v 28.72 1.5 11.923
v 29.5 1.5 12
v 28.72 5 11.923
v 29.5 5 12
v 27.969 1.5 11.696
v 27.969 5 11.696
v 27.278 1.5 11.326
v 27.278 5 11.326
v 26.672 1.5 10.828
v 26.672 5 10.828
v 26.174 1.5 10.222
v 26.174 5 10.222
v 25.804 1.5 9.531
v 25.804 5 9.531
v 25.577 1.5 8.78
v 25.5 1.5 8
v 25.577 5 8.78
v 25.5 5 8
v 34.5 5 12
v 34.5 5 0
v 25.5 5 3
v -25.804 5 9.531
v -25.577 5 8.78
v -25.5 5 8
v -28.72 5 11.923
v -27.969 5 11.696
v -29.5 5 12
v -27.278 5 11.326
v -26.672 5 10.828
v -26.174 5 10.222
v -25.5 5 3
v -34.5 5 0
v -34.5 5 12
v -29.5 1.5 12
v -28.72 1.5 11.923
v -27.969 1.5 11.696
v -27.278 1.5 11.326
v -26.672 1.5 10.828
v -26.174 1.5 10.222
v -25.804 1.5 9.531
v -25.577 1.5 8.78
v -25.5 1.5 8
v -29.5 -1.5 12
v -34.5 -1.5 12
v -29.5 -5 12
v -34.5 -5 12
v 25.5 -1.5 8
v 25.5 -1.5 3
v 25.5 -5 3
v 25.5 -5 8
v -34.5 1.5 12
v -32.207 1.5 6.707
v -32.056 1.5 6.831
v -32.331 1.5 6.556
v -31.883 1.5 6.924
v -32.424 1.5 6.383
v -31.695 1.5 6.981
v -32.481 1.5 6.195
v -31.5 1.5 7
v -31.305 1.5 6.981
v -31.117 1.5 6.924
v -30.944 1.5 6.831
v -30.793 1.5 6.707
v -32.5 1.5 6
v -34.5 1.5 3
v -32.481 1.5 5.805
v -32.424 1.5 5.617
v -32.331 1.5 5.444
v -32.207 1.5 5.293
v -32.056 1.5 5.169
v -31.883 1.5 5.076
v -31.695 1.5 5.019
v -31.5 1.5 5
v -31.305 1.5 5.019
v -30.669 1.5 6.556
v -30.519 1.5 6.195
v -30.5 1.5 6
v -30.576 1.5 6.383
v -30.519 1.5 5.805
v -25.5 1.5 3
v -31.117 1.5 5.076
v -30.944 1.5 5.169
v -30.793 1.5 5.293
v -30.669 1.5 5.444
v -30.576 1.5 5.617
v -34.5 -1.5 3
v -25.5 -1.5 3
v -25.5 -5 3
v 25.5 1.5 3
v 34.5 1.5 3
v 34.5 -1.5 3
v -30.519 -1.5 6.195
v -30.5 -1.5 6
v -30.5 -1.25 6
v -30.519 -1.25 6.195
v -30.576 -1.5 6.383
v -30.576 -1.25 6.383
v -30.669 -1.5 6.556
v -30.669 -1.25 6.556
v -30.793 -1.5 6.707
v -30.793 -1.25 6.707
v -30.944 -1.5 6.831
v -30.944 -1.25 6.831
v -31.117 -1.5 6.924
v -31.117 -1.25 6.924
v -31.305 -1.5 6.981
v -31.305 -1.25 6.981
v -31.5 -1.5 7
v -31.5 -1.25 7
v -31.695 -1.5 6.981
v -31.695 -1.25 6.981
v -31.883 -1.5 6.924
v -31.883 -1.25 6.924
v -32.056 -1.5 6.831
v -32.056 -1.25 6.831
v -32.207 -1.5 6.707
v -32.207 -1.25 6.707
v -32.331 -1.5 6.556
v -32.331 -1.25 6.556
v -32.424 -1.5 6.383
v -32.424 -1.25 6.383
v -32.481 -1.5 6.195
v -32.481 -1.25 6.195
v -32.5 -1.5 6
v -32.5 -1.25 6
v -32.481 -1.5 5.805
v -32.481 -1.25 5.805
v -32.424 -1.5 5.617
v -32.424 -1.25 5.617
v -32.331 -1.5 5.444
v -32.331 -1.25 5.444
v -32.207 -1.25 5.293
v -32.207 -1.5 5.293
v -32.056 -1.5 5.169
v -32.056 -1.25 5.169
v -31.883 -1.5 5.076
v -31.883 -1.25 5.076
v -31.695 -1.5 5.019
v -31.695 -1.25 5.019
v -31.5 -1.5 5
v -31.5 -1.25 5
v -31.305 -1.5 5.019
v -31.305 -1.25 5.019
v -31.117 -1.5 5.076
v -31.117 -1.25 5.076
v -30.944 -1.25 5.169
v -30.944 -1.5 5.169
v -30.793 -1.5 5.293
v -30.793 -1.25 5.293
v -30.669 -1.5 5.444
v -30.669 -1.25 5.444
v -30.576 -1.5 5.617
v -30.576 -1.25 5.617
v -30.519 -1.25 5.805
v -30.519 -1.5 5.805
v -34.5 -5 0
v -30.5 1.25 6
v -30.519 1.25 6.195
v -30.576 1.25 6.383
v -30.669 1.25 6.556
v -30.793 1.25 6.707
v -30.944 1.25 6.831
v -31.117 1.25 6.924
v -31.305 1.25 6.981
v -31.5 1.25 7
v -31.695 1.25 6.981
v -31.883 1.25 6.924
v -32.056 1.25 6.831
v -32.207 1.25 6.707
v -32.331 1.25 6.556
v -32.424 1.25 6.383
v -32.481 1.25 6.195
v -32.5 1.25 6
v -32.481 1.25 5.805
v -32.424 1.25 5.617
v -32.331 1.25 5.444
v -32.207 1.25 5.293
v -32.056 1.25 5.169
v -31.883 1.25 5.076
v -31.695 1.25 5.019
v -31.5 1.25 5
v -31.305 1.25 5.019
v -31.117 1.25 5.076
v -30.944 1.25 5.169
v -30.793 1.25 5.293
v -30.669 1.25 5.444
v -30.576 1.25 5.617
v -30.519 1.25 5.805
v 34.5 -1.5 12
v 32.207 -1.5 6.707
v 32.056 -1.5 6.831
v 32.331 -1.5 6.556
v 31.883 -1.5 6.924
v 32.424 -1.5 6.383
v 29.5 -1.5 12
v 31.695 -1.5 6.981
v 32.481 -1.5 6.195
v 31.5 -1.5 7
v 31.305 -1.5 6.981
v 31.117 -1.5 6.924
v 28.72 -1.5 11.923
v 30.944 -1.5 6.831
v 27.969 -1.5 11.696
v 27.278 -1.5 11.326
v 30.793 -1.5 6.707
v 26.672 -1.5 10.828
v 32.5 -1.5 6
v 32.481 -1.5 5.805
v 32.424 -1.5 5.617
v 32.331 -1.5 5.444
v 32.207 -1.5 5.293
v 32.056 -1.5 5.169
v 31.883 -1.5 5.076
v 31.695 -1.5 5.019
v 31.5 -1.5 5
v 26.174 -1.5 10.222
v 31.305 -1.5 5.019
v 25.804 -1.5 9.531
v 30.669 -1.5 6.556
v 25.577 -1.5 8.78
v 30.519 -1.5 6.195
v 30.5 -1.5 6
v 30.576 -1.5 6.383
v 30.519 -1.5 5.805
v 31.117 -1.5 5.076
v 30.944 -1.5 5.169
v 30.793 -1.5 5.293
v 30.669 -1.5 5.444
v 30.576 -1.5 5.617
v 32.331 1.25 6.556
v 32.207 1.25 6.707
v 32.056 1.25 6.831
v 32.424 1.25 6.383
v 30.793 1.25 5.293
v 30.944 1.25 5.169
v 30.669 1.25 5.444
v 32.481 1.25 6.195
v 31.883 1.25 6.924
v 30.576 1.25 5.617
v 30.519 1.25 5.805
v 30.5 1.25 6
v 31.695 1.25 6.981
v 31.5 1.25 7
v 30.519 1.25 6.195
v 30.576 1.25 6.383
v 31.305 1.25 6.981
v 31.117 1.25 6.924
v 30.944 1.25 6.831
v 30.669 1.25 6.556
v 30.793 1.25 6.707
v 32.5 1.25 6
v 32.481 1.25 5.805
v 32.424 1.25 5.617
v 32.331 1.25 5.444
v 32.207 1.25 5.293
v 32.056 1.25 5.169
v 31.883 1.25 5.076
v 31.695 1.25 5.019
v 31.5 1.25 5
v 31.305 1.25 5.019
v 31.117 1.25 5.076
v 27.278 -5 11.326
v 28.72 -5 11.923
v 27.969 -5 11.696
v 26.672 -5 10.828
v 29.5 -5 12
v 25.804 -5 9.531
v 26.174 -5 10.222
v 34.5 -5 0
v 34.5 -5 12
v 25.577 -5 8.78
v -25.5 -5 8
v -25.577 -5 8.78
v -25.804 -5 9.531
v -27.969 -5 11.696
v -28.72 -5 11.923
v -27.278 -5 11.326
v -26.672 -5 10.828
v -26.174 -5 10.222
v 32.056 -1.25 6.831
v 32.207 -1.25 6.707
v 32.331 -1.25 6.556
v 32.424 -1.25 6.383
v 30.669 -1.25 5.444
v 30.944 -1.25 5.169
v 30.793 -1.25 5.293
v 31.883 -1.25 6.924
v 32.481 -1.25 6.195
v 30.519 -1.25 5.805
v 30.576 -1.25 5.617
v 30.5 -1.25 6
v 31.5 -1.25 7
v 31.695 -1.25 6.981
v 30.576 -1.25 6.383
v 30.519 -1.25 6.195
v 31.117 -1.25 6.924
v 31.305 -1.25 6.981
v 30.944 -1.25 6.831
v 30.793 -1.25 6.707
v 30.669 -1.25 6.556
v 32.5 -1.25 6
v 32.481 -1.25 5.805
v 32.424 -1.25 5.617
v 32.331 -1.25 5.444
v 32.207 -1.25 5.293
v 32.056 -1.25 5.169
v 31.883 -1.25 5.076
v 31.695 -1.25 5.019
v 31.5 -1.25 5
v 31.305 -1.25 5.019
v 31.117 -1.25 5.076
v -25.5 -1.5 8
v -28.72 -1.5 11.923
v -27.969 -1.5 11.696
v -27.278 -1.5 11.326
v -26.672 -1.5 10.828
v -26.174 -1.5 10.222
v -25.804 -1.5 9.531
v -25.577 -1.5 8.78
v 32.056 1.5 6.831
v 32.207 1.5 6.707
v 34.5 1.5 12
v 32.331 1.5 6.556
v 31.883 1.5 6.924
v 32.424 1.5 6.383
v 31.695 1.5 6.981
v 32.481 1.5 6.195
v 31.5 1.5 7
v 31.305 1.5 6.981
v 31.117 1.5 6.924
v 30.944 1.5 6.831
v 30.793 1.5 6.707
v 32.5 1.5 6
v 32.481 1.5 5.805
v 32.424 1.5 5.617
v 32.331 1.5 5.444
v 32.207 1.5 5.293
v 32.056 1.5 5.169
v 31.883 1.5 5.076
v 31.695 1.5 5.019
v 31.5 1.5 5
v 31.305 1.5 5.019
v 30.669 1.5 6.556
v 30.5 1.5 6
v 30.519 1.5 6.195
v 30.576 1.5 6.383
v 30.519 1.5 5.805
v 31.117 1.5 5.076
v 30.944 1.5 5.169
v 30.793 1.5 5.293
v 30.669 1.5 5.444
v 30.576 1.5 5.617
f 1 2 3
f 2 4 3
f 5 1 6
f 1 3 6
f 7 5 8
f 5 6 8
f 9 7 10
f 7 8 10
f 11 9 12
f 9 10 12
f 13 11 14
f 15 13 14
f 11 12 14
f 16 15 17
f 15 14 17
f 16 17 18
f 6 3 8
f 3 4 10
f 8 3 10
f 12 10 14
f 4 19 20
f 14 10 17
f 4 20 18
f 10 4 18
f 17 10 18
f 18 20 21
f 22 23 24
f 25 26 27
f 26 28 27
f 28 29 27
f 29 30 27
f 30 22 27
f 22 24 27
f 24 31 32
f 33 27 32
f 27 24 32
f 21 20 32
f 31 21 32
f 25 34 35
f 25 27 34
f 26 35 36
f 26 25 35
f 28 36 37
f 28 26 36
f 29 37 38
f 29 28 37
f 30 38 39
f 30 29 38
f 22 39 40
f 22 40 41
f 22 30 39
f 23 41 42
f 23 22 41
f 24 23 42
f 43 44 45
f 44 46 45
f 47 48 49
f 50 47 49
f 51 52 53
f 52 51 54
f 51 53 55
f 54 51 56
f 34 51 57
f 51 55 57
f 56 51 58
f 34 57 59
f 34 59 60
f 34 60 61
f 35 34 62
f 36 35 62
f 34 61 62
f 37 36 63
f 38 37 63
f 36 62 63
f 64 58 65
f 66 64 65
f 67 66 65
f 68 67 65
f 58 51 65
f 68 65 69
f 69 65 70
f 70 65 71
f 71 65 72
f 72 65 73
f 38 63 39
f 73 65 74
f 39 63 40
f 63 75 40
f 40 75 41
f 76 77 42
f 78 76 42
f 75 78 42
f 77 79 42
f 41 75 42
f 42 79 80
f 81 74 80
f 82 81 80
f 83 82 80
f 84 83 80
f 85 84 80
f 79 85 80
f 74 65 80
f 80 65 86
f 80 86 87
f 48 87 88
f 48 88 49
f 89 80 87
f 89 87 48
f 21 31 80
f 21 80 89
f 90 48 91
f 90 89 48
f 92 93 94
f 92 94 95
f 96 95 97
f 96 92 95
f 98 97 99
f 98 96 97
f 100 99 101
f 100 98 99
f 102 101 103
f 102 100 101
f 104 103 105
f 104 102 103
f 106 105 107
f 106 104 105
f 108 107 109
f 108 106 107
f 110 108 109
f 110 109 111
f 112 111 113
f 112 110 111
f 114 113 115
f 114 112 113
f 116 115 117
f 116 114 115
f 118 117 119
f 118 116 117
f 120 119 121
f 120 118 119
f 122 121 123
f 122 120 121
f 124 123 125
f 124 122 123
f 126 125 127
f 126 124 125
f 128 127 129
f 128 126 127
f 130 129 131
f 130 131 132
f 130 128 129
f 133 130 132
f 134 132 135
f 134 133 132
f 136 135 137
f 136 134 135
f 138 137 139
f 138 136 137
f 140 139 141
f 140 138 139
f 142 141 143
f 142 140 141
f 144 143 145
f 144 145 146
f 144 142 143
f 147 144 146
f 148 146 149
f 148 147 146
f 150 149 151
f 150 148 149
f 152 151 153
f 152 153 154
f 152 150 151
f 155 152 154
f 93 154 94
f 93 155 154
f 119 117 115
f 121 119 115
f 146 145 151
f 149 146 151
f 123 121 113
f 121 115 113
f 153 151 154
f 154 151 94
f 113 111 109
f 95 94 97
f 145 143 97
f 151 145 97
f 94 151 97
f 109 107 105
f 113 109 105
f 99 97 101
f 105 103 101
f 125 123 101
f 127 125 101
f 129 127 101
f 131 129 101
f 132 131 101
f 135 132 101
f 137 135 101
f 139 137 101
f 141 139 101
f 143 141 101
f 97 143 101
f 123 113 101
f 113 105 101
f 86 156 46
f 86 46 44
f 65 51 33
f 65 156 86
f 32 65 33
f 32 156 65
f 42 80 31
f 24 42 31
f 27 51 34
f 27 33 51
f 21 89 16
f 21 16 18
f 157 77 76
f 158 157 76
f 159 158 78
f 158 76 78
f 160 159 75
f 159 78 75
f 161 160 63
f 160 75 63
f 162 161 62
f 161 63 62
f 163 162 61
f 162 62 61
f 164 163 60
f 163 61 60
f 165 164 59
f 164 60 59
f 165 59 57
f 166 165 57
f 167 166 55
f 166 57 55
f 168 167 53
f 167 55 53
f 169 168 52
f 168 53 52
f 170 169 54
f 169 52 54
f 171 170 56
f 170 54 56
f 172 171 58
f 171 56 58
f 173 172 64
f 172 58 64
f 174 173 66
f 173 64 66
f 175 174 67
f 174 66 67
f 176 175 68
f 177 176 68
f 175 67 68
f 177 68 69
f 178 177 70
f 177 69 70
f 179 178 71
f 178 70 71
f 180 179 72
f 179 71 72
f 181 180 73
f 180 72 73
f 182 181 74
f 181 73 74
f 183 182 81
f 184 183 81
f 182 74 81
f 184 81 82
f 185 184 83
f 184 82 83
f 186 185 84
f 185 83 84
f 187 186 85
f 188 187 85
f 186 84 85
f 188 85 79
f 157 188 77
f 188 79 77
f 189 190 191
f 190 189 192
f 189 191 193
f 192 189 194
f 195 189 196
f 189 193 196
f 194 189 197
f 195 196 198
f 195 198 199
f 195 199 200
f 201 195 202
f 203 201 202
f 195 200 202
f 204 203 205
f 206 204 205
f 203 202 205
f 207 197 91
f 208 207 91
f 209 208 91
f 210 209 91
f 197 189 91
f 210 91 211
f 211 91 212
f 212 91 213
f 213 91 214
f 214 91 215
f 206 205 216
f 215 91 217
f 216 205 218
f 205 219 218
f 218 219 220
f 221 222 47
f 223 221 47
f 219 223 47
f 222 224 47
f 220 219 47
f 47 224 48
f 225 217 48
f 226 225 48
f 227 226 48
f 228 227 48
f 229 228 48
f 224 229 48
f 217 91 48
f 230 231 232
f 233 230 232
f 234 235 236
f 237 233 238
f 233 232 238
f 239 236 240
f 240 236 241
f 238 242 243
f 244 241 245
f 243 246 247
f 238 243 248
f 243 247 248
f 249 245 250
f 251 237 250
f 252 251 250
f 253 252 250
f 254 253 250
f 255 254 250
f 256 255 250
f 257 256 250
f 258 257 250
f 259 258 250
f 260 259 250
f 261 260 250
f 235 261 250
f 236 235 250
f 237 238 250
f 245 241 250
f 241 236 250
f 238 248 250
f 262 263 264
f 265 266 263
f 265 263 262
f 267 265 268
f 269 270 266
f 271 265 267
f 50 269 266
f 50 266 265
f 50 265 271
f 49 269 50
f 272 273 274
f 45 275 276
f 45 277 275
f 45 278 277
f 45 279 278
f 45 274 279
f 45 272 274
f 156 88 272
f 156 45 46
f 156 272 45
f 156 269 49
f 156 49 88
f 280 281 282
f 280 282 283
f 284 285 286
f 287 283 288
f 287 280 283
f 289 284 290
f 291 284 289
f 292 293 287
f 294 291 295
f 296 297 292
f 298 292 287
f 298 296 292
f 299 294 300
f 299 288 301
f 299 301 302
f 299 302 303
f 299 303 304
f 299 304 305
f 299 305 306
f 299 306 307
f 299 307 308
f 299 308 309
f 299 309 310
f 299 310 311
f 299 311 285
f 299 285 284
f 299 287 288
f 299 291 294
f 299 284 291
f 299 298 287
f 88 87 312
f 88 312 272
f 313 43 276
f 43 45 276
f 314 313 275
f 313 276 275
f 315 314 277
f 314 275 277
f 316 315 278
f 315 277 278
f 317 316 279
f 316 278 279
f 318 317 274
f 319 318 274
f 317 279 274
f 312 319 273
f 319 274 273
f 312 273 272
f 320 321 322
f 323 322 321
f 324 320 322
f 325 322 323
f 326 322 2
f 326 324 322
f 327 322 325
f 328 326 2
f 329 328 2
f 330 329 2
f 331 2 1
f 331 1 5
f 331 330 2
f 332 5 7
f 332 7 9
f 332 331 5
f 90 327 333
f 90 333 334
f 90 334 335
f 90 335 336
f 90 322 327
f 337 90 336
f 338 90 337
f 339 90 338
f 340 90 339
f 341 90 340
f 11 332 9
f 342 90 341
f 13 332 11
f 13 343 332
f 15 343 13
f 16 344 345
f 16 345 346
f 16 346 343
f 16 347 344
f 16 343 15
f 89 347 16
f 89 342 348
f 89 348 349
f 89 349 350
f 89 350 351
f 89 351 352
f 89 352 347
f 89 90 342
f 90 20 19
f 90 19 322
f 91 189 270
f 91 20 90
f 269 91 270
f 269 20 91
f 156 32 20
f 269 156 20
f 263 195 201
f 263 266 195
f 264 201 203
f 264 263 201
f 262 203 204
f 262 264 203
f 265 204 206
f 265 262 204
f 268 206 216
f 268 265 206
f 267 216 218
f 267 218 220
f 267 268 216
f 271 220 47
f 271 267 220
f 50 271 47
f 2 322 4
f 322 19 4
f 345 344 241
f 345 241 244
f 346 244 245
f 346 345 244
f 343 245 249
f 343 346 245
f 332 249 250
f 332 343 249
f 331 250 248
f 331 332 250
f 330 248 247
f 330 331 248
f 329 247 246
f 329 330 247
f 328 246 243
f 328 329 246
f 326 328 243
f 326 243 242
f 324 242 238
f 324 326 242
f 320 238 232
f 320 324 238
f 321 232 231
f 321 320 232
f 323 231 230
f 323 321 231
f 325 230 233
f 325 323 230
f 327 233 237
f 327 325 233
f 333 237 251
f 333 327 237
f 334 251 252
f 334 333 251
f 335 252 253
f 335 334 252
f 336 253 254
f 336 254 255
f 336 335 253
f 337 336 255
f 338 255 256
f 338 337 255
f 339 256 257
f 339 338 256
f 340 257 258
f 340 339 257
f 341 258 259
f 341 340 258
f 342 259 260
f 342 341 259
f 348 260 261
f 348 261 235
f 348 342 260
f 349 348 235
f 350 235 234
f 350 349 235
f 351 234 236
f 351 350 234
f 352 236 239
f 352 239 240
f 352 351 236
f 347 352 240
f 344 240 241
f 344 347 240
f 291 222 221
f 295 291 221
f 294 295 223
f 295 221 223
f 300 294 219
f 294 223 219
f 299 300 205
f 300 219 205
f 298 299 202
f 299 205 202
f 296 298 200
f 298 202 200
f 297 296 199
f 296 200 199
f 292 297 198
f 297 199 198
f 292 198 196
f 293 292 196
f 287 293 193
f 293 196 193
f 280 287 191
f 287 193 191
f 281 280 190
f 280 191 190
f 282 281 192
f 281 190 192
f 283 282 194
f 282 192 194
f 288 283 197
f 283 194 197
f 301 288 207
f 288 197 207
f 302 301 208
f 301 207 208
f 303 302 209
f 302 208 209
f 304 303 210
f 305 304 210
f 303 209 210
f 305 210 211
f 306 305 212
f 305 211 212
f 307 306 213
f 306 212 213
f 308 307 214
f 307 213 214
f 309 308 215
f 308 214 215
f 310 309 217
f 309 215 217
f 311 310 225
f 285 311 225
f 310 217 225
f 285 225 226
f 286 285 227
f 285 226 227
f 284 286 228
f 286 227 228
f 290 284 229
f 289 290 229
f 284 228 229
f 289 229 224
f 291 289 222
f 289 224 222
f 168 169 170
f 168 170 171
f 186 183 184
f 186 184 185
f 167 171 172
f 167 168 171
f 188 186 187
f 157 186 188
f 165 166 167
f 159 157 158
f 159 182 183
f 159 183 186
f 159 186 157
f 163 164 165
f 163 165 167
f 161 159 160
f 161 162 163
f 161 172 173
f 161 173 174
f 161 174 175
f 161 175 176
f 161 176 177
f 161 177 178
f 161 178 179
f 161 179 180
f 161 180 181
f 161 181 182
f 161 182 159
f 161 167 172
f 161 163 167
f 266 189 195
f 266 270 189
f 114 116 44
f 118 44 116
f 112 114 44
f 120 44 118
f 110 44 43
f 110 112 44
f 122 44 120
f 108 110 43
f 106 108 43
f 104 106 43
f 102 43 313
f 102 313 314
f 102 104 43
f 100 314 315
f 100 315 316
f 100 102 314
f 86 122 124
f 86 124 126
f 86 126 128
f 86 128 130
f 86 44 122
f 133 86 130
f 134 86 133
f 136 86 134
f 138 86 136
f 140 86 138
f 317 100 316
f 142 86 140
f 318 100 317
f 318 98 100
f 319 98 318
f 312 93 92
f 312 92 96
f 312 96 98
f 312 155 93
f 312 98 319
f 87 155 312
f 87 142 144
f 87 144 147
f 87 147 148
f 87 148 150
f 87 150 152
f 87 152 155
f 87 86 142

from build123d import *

# Parameters (mm, degrees)
F2_W     = 69
F2_H     = 10
F3_DEPTH = 3
F4_W     = 9
F4_H     = 3.5
F5_DEPTH = 9
F6_R     = 1
F7_DEPTH = 0.25
F8_R     = 4


with BuildPart() as f3:
    # F2 (on Top) → F3 (new body)
    with BuildSketch(Plane.XY):
        Rectangle(F2_W, F2_H)
    extrude(amount=F3_DEPTH)

    # F4 (on face) → F5 (join)
    with BuildSketch(Plane.XY.offset(3)):
        with Locations((-30, 3.25)):
            Rectangle(F4_W, F4_H)
    extrude(amount=F5_DEPTH)

    # F6 (on face) → F7 (join)
    with BuildSketch(Plane.XZ.offset(-1.5)):
        with Locations((-31.5, 6)):
            Circle(F6_R)
    extrude(amount=F7_DEPTH)

    # F8
    f8_edges = [f3.edges().sort_by_distance(p)[0] for p in [
        (-25.5, 3.25, 12),
    ]]
    fillet(f8_edges, radius=F8_R)

    # F9: F3 across plane


with BuildPart() as f3_1:
    add(f3.part)
    add(f3.part.mirror(Plane.YZ))

    # F10: F3 across plane


with BuildPart() as f3_2:
    add(f3_1.part)
    add(f3_1.part.mirror(Plane.XZ))


solid = f3_2.part
